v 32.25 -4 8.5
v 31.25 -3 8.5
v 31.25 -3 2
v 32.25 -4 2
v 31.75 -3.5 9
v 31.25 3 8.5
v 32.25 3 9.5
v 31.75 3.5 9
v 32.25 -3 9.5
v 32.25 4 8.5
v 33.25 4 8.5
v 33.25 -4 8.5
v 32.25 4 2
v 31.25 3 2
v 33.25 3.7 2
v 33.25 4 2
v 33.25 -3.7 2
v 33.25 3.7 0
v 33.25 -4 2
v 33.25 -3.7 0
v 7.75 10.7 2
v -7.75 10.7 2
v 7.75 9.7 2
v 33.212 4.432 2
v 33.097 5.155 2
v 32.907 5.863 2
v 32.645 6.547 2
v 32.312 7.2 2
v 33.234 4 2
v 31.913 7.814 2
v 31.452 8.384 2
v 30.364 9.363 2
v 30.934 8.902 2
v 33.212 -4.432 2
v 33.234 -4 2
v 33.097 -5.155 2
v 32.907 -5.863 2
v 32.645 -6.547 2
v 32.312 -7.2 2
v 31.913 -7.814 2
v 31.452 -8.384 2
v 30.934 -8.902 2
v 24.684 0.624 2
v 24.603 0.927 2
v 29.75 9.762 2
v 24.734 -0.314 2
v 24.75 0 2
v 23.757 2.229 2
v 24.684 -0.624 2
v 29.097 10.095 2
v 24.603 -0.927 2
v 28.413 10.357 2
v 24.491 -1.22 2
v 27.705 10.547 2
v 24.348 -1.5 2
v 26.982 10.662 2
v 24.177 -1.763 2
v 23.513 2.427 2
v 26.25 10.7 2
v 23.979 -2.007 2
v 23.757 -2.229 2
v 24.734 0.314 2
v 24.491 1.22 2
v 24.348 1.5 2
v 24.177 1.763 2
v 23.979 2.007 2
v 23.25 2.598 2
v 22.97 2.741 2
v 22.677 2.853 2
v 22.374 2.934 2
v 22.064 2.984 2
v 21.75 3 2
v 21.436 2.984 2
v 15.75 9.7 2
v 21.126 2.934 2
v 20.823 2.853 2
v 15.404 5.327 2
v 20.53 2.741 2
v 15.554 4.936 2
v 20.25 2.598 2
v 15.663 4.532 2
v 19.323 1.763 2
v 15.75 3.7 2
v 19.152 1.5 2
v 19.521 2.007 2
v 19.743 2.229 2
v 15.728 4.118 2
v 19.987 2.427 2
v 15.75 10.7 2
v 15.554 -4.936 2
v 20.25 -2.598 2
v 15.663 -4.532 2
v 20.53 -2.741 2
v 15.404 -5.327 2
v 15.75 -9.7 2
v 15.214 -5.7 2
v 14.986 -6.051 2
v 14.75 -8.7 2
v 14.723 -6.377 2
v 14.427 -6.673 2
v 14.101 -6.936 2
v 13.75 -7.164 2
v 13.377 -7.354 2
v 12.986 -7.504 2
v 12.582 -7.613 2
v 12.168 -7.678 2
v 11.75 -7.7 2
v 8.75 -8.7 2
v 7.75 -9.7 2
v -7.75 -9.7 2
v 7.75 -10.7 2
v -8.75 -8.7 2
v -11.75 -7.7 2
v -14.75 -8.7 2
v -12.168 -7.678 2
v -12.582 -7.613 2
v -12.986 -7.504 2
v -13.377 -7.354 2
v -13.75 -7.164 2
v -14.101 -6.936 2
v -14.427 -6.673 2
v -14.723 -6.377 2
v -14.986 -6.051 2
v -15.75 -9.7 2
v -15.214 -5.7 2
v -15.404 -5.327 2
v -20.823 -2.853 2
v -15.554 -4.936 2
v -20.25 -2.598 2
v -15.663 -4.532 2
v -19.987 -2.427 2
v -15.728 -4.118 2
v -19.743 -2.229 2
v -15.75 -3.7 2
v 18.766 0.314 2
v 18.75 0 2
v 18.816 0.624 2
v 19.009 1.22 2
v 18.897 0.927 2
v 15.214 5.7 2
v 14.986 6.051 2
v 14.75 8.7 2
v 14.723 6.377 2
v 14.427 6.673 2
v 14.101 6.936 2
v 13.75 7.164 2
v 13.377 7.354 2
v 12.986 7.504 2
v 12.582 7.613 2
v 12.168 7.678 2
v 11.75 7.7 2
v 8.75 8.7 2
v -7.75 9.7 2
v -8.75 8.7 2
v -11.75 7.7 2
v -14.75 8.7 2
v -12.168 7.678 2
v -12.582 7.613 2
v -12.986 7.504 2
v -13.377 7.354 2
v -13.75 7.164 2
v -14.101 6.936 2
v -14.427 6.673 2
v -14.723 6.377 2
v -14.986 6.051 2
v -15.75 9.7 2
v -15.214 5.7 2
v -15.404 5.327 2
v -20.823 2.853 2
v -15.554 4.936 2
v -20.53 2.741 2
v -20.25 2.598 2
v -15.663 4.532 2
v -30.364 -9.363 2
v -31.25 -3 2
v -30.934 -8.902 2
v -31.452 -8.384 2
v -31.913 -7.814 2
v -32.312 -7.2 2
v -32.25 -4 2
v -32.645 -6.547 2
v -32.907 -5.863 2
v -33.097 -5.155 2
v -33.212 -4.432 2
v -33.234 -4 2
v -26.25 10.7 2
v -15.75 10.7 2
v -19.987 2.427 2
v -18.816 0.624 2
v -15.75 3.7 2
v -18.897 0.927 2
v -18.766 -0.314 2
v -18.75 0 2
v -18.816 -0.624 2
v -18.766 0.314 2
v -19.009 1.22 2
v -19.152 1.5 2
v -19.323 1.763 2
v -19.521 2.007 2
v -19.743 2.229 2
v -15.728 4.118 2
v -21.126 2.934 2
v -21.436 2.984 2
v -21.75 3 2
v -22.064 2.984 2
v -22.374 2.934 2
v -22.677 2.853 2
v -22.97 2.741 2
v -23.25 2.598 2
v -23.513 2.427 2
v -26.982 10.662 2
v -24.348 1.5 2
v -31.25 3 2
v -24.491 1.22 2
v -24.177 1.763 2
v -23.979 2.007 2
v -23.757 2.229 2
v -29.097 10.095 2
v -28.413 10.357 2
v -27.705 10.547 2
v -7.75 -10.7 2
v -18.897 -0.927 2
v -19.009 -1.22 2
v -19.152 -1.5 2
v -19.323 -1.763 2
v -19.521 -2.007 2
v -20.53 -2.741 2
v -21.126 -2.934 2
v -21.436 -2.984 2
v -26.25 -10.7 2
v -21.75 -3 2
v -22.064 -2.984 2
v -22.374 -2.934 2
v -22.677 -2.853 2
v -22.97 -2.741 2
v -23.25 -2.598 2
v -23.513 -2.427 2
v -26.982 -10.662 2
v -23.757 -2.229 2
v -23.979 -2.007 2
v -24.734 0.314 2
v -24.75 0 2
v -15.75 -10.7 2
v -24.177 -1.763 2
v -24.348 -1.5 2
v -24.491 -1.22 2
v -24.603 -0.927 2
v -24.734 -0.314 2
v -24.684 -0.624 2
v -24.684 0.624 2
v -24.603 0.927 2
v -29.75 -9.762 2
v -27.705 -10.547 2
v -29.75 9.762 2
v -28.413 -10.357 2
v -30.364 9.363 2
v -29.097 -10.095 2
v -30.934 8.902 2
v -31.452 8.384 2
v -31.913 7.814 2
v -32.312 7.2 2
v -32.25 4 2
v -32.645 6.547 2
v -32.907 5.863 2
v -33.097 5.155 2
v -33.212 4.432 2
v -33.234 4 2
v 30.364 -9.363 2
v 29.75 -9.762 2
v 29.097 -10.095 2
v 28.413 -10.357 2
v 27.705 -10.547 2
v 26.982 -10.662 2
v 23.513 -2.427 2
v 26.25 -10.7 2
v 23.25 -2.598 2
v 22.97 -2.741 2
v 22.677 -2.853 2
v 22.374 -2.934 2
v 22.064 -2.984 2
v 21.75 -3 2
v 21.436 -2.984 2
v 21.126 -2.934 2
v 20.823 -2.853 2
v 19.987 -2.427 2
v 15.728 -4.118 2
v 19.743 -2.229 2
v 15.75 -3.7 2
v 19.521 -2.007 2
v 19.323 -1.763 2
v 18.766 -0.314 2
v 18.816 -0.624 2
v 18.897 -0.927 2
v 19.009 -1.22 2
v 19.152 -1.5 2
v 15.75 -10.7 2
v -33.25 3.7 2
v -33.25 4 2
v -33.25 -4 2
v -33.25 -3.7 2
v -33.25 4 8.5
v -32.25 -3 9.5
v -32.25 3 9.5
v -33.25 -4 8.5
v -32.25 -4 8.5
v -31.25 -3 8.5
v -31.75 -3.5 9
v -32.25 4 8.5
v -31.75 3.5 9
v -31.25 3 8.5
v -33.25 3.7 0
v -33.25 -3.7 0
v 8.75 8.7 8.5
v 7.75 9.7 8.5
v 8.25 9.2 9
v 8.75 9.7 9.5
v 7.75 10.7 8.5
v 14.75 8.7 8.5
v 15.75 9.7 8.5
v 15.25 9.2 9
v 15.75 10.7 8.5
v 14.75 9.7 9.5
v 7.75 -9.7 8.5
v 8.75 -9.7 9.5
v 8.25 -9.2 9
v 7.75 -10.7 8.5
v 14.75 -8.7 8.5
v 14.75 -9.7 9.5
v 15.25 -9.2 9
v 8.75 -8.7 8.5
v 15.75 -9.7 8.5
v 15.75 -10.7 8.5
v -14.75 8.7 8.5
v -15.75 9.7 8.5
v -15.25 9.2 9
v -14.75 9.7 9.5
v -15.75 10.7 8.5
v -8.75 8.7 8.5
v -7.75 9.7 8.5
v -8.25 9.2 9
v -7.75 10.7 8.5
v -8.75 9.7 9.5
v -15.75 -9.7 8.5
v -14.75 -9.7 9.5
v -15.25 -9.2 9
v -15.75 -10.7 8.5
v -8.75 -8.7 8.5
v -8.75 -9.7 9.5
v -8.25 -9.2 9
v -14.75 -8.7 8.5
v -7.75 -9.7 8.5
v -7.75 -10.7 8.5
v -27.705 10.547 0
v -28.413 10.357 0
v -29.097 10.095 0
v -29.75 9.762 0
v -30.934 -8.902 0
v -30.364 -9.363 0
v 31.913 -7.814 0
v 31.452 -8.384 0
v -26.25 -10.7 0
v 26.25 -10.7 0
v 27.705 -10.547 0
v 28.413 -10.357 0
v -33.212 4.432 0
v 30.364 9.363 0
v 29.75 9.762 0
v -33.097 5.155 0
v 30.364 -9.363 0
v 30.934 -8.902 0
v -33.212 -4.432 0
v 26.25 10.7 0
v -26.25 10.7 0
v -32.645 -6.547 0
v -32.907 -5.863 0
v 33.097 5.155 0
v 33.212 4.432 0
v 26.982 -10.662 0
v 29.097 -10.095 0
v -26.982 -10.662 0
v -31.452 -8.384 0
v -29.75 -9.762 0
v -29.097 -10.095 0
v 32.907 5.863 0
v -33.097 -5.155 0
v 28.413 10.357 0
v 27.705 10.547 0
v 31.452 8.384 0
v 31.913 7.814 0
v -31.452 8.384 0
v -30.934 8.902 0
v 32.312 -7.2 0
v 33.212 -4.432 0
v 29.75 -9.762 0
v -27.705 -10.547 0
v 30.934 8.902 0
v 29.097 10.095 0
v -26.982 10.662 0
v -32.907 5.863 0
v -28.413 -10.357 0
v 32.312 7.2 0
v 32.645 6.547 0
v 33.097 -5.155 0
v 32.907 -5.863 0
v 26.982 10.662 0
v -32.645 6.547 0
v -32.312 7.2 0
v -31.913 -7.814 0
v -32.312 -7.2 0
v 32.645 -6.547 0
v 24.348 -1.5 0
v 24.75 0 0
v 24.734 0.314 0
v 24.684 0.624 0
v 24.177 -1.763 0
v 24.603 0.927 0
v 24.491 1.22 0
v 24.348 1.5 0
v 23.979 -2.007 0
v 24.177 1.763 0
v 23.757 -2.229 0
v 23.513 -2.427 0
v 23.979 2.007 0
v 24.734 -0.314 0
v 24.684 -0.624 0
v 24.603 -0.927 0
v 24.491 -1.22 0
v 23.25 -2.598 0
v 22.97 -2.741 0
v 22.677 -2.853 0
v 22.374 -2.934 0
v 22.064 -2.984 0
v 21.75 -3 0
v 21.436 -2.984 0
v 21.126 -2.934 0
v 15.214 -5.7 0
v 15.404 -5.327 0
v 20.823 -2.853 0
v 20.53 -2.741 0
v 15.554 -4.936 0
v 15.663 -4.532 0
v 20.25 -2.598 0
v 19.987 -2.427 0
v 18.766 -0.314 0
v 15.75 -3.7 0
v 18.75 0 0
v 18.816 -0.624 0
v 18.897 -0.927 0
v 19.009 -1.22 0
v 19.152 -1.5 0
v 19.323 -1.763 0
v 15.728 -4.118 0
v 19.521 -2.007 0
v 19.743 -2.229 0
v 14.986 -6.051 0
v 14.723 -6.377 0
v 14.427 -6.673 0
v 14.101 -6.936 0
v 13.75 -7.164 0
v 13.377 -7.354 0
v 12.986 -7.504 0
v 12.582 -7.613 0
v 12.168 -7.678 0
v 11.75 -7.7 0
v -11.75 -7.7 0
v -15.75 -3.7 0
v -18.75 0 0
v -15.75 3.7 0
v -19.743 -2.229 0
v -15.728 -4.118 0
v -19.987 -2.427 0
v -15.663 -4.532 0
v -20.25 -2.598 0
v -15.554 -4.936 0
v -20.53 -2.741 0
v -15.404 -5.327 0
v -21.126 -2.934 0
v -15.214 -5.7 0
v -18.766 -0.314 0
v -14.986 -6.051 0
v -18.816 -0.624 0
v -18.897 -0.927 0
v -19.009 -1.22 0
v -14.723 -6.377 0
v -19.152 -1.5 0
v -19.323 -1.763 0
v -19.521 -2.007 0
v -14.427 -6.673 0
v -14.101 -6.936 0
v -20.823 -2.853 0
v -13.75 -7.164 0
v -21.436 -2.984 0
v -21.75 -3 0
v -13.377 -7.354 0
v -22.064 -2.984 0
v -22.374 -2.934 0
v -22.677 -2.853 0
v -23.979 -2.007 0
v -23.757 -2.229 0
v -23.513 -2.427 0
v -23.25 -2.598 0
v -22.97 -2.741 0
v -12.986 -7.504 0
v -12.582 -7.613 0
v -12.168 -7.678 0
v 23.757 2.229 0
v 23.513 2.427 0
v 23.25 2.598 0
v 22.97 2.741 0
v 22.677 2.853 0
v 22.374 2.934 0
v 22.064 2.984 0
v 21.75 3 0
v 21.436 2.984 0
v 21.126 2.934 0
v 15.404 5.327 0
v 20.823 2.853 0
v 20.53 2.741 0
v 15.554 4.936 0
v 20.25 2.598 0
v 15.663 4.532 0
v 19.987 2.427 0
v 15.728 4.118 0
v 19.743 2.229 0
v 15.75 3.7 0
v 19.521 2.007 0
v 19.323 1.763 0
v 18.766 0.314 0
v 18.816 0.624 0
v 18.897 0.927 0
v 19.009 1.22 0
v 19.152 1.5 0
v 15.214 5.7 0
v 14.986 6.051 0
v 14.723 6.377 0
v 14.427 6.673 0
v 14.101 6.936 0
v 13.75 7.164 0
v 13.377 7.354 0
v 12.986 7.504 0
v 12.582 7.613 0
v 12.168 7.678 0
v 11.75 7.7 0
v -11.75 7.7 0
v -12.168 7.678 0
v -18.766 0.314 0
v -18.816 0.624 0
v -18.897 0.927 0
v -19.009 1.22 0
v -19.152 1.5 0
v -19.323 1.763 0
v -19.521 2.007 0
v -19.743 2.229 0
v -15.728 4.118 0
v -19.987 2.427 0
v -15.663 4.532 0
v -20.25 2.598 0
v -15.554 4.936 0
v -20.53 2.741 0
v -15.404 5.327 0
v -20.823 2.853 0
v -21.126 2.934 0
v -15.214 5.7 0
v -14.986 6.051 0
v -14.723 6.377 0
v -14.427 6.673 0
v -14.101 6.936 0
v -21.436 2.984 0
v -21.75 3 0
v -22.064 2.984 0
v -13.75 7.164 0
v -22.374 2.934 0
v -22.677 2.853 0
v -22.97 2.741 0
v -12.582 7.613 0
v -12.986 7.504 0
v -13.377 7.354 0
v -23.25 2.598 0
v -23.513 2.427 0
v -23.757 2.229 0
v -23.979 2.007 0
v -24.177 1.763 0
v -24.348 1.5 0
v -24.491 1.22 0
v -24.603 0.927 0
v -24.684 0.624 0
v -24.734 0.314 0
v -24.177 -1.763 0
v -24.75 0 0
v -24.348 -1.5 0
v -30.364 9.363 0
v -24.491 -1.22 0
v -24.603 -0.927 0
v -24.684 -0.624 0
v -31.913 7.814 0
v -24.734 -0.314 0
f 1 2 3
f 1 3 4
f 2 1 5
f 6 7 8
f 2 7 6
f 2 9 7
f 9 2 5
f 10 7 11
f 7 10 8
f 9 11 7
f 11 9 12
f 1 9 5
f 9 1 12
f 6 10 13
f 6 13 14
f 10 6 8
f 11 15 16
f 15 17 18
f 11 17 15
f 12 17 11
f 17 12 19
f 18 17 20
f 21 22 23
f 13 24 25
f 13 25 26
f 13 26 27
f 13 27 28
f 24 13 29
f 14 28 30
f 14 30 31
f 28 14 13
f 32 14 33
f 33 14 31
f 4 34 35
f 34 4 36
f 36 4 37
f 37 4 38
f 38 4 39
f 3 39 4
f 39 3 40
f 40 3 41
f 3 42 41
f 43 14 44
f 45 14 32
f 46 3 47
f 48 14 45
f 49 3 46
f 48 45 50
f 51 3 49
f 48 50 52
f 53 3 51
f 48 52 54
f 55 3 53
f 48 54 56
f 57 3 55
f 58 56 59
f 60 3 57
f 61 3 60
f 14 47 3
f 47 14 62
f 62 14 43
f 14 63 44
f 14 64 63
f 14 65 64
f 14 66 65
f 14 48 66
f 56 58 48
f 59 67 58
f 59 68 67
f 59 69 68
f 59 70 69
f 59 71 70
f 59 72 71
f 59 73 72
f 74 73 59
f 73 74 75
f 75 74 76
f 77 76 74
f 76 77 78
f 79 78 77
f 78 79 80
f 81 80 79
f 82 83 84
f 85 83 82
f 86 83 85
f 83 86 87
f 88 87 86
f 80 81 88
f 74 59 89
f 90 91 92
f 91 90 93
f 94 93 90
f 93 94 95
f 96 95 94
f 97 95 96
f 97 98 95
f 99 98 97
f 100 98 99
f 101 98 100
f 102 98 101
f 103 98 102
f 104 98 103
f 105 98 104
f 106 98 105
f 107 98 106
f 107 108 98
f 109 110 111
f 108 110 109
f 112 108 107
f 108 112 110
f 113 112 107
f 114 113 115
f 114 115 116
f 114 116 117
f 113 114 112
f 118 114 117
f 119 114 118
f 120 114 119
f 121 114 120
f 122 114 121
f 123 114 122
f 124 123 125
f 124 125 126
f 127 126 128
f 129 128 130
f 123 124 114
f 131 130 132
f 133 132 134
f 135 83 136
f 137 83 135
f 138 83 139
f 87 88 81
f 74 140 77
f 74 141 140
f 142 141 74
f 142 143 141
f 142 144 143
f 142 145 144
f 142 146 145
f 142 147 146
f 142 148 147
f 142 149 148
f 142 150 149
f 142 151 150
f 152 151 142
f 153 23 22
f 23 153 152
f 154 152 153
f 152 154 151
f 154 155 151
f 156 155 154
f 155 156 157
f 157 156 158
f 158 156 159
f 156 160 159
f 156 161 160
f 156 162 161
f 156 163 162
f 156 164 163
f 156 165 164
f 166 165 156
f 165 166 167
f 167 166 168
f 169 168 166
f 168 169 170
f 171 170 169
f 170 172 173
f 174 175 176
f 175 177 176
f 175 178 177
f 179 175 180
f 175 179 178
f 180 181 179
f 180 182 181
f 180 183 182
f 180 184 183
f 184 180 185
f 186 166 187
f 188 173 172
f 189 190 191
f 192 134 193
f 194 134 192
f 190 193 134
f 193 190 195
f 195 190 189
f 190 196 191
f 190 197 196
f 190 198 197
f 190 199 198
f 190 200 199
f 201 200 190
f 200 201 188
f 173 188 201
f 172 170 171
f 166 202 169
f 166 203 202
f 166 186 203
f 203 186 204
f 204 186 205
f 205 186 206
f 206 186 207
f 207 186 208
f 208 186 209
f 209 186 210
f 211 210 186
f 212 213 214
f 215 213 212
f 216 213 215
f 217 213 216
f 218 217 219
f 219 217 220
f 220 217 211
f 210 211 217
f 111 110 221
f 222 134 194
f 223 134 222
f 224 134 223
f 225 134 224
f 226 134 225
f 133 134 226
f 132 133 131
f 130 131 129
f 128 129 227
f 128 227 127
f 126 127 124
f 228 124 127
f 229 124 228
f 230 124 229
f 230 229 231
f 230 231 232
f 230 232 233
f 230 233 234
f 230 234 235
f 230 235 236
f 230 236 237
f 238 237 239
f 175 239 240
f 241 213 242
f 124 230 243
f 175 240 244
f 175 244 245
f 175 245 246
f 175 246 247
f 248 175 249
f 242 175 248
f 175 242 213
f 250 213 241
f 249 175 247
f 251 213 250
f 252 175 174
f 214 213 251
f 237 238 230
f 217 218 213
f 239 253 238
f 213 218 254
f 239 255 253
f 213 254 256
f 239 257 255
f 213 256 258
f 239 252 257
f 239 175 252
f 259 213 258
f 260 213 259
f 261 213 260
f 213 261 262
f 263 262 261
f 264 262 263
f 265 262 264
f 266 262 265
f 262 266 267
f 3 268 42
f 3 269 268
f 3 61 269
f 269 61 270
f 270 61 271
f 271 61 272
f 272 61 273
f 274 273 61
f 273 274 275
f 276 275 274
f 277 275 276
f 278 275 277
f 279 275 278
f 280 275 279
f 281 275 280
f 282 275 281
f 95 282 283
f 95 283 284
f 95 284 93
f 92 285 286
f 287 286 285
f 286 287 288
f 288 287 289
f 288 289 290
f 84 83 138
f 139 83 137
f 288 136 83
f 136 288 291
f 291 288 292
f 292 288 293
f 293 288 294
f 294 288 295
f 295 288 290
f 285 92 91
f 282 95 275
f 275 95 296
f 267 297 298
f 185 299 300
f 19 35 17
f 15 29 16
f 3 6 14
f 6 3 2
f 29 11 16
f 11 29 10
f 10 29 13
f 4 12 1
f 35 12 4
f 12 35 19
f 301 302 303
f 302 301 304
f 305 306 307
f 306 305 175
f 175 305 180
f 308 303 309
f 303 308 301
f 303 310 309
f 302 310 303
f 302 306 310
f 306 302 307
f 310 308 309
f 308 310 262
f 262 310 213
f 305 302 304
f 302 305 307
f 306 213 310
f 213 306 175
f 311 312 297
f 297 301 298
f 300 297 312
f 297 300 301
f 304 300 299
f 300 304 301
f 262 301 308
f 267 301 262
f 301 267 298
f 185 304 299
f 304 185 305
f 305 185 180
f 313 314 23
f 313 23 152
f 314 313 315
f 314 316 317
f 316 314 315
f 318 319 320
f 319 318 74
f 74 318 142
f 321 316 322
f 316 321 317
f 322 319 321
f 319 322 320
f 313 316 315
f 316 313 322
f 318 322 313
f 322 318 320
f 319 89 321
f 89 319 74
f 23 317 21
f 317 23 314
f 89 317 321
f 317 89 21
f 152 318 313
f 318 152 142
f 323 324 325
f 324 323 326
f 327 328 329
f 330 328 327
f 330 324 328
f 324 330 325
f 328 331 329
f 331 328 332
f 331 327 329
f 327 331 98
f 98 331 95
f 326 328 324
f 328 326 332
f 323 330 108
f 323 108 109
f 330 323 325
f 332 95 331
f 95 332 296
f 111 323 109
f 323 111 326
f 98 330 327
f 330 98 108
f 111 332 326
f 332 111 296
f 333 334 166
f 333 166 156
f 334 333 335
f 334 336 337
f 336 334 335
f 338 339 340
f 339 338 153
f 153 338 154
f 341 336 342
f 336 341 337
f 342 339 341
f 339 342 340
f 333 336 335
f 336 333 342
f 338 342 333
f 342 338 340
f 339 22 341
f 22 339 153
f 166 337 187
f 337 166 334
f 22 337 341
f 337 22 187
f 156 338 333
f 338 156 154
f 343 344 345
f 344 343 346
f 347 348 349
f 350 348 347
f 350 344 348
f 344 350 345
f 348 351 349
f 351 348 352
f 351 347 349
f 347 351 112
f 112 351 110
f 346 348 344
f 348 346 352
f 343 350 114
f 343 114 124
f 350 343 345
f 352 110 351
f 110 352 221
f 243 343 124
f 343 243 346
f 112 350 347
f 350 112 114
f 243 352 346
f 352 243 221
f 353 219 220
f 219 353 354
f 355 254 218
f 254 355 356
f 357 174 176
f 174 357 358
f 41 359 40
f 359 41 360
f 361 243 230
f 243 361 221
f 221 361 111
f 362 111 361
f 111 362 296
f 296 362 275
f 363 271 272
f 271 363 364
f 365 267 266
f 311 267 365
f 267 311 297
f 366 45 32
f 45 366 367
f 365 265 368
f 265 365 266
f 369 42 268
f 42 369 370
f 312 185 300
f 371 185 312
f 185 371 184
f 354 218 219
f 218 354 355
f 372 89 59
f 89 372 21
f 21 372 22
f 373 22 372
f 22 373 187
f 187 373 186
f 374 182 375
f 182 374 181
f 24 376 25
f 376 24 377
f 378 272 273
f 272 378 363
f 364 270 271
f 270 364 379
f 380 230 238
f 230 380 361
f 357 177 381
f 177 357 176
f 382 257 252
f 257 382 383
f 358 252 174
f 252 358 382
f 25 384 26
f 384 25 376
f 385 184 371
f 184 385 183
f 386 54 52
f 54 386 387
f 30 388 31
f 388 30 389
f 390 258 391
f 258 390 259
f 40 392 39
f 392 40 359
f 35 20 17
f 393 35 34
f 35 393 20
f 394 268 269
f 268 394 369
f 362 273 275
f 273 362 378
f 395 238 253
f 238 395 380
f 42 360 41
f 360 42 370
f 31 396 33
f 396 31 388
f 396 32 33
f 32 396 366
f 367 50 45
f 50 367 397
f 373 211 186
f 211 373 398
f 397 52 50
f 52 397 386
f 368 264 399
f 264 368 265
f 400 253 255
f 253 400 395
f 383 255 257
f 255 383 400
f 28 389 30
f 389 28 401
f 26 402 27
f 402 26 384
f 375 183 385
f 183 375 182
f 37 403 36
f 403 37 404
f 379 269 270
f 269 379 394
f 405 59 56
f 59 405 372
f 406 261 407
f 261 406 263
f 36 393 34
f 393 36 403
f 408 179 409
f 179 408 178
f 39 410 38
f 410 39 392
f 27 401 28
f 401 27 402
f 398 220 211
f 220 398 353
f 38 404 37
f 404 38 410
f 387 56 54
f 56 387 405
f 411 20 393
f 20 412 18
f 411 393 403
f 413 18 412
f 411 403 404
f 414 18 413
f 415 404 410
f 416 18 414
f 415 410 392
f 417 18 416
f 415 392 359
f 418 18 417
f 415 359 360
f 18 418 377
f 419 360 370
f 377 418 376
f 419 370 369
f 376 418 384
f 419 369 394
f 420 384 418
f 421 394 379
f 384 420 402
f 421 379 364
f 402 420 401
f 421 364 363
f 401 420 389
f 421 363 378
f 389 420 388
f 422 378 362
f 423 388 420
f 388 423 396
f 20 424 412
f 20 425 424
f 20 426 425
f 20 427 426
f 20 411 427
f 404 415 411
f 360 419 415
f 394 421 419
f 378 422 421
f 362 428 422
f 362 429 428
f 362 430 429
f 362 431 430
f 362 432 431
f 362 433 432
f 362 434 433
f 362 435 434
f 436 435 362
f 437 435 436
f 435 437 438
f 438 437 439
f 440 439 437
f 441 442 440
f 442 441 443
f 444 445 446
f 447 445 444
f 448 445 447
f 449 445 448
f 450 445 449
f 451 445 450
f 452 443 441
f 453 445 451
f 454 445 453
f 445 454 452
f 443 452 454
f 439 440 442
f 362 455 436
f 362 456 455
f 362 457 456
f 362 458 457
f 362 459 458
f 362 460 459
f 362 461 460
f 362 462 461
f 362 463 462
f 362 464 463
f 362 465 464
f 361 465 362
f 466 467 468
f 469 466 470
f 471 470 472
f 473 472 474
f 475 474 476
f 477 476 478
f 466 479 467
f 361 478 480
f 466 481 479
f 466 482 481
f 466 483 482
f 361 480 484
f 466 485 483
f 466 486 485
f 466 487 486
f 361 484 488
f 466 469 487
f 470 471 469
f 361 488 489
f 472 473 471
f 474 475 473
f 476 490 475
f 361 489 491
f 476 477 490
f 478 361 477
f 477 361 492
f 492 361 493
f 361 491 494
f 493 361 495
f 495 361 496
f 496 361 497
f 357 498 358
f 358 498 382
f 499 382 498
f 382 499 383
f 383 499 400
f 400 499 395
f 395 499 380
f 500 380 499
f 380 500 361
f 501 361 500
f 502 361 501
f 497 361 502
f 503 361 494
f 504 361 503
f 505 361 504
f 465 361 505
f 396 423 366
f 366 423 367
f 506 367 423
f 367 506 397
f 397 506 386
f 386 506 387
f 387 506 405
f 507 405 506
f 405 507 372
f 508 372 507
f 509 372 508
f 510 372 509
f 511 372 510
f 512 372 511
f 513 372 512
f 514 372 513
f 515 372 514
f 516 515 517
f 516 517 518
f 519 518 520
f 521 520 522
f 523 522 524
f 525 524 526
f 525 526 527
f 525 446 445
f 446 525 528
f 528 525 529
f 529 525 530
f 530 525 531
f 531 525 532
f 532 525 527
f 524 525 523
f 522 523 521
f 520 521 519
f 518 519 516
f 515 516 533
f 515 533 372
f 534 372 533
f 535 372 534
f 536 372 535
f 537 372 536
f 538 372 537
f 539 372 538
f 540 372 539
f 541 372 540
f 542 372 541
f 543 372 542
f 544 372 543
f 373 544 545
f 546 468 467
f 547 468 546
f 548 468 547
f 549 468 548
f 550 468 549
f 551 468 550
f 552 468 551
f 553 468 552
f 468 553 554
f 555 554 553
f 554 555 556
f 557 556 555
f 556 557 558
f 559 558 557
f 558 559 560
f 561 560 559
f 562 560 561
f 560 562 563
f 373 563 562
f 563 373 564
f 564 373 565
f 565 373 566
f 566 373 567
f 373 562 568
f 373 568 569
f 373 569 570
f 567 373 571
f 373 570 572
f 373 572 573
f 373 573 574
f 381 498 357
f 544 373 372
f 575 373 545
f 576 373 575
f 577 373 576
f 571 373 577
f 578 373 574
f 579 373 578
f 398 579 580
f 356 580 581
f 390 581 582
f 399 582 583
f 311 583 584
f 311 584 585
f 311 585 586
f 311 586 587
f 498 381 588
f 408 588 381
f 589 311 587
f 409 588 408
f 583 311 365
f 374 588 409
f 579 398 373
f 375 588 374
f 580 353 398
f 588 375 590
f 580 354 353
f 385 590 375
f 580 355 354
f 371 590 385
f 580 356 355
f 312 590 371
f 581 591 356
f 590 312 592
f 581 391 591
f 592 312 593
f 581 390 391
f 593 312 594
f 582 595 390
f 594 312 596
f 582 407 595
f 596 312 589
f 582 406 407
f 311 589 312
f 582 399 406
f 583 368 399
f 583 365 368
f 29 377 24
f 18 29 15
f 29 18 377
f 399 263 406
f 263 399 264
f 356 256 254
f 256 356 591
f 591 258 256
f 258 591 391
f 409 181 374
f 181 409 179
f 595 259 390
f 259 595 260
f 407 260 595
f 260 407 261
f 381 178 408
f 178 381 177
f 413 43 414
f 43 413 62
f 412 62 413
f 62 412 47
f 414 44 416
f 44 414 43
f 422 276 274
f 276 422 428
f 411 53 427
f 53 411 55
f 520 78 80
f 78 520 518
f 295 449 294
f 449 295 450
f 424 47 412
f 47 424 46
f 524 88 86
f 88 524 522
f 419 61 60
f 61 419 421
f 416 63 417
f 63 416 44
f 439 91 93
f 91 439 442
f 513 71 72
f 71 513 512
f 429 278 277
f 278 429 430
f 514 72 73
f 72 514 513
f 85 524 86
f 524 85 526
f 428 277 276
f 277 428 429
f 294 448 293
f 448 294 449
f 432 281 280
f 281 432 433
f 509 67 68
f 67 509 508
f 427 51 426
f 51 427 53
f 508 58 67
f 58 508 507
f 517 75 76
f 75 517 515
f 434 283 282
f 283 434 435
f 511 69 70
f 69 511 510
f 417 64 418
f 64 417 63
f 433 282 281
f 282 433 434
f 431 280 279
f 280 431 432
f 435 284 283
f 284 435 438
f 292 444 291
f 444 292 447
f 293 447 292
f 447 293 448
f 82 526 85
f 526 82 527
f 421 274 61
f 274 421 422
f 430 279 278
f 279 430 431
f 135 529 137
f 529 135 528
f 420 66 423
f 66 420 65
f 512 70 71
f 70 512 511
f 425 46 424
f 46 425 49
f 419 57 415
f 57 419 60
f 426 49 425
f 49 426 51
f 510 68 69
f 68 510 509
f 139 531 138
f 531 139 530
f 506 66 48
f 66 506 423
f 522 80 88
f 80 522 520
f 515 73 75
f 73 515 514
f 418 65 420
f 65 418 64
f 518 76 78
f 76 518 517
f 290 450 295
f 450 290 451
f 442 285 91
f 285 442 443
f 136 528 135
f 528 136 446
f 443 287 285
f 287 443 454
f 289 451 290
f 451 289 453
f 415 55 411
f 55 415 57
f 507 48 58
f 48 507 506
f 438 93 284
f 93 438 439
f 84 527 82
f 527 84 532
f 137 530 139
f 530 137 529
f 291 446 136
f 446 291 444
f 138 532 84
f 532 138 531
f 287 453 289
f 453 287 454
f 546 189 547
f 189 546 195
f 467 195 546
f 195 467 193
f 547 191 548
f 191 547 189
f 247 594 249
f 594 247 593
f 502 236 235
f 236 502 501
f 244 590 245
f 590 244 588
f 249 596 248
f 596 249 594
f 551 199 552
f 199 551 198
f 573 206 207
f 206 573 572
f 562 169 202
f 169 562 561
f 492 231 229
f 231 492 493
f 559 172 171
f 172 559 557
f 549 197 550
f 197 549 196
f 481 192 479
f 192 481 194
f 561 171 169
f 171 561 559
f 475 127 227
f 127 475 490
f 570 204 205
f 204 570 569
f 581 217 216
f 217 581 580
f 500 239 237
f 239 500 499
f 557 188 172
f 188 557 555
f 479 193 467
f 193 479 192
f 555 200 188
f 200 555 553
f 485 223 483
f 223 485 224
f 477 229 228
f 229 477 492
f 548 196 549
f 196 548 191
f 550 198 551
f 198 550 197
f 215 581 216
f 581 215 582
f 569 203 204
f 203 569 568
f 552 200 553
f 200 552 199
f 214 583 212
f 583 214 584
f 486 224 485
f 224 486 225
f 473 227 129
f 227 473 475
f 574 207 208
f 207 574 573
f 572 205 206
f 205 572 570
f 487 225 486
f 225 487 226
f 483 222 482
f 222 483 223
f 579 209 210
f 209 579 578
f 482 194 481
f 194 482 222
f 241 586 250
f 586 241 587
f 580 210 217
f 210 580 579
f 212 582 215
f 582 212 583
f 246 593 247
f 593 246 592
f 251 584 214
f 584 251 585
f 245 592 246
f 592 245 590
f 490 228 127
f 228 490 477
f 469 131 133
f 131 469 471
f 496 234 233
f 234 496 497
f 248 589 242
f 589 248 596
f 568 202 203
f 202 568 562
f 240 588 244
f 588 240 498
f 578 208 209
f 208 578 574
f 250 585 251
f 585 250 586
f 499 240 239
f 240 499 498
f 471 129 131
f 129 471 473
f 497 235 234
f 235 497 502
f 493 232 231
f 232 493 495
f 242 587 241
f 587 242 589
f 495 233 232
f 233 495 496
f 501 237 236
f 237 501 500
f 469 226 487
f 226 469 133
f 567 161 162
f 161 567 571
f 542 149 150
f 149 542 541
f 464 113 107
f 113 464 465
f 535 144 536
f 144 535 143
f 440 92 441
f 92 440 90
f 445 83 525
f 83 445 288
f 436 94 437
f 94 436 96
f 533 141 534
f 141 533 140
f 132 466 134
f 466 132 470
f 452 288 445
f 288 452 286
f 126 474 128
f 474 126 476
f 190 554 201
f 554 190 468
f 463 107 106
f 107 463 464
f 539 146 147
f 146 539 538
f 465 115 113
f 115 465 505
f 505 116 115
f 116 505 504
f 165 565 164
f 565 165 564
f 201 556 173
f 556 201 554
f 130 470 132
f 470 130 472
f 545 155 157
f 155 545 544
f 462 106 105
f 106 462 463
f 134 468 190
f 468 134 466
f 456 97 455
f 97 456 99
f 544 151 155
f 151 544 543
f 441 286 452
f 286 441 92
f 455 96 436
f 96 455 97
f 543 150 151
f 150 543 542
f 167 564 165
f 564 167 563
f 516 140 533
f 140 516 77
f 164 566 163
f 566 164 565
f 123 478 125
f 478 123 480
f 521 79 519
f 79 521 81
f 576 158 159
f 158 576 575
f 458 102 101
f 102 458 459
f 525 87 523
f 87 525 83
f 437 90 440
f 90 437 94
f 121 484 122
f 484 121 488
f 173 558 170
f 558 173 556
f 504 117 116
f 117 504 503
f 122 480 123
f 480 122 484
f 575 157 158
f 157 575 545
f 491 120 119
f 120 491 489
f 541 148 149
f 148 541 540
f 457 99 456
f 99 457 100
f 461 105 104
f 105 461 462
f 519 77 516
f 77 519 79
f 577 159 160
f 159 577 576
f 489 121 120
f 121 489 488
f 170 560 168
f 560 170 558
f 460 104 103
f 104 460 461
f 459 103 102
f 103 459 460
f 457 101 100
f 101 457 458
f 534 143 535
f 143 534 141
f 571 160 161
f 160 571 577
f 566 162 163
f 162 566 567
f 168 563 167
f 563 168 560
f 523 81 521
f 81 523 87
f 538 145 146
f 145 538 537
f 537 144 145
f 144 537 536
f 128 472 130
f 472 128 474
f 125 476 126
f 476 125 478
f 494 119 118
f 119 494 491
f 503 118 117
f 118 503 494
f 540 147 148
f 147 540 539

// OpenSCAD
//This code uses the 'Chamfered primitives for OpenSCAD library, by SebiTimeWaster - https://github.com/SebiTimeWaster/Chamfers-for-OpenSCAD
//For the convenience of users, that code is included in this file, as noted in the lower part of this file
//For users wishing to link in the latest Chamfers-for-OpenSCAD code, the following line can be uncommented, and the included code at the bottom of this page can be commented out or removed.
//use <Chamfers-for-OpenSCAD/Chamfer.scad>;
    
$fn=60;

bolt_c_c = 43.5;        //center-to-center distance between bolts
bolt_shank_dia = 6;     //shank diameter of bolt (where bolting battery tray to quad frame) - make same diameter as bolt head for tray that will simply sit over bolt heads
bolt_head_dia = 6;      //bolt head diameter of bolt (where countersinking bolt, or making tray to sit over bolt head)
bolt_head_inset = 1;    //depth to countersink bolt head to (applicable if bolt shank and head settings are different diameters)
batt_len = 62.5;        //length of the battery, plus a mm or so of wiggle room
batt_w = 17.4;          //width of the battery, plus a mm or so of wiggle room
base_t = 2;             //thickness of the base plate
base_corner_r = 7;      //corner radius of plate external corners - must be a sensible value that works with plate width - some experimentation may be needed
finger_t = 2;           //thickness of battery holding fingers
finger_w = 8;           //width of battery holding fingers
finger_h = 7.5;         //height of battery holding fingers
hole_web_t = 3;         //width of side walls - should be at least as bit as finger_t parameter
center_hole_r = 4;      //inside corner radious of plate internal corners - must be a sensible value that works with plate width - some experimentation may be needed

difference() {
    union() {
        batt_base();
        batt_fingers();
    }
    
    bolt_holes();
    center_hole();
}



module batt_base() {
    hull() {
        translate([batt_len/2 - base_corner_r + finger_t, batt_w/2 - base_corner_r + finger_t, 0]) {
            cylinder(r=base_corner_r, h=base_t);
        }
        translate([batt_len/2 - base_corner_r + finger_t, -batt_w/2 + base_corner_r - finger_t, 0]) {
            cylinder(r=base_corner_r, h=base_t);
        }
        translate([-batt_len/2 + base_corner_r - finger_t, batt_w/2 - base_corner_r + finger_t, 0]) {
            cylinder(r=base_corner_r, h=base_t);
        }
        translate([-batt_len/2 + base_corner_r - finger_t, -batt_w/2 + base_corner_r - finger_t, 0]) {
            cylinder(r=base_corner_r, h=base_t);
        }
       }
}

module batt_fingers() {
    //end fingers
    translate([batt_len/2, -finger_w/2, base_t]) {
         chamferCube(finger_t, finger_w, finger_h, chamferHeight=1, chamferX = [0,0,1,1], chamferY = [0,1,1,0], chamferZ = [1,0,0,1]); 
    }
    translate([-batt_len/2 - finger_t, -finger_w/2, base_t]) {
        chamferCube(finger_t, finger_w, finger_h, chamferHeight=1, chamferX = [0,0,1,1], chamferY = [0,1,1,0], chamferZ = [0,1,1,0]); 
    }
    
    //side fingers
    translate([bolt_c_c/2 - bolt_shank_dia/2 - hole_web_t - finger_w, batt_w/2, base_t]) {
        chamferCube(finger_w, finger_t, finger_h, chamferHeight=1, chamferX = [0,0,1,1], chamferY = [0,1,1,0], chamferZ = [1,1,0,0]);
    }
    
    translate([bolt_c_c/2 - bolt_shank_dia/2 - hole_web_t - finger_w, -batt_w/2 - finger_t, base_t]) {
        chamferCube(finger_w, finger_t, finger_h, chamferHeight=1, chamferX = [0,0,1,1], chamferY = [0,1,1,0], chamferZ = [0,0,1,1]);
    }

    translate([-bolt_c_c/2 + bolt_shank_dia/2 + hole_web_t, batt_w/2, base_t]) {
        chamferCube(finger_w, finger_t, finger_h, chamferHeight=1, chamferX = [0,0,1,1], chamferY = [0,1,1,0], chamferZ = [1,1,0,0]);
    }
    
    translate([-bolt_c_c/2 + bolt_shank_dia/2 + hole_web_t, -batt_w/2 - finger_t, base_t]) {
        chamferCube(finger_w, finger_t, finger_h, chamferHeight=1, chamferX = [0,0,1,1], chamferY = [0,1,1,0], chamferZ = [0,0,1,1]);
    }
}

module center_hole() {
    hull() {
        translate([bolt_c_c/2 - bolt_shank_dia/2 - hole_web_t - center_hole_r, batt_w/2 - center_hole_r + finger_t - hole_web_t]) {
            cylinder(r=center_hole_r, h=base_t);
        }
        translate([bolt_c_c/2 - bolt_shank_dia/2 - hole_web_t - center_hole_r, -(batt_w/2 - center_hole_r + finger_t - hole_web_t), 0]) {
            cylinder(r=center_hole_r, h=base_t);
        }
        translate([-(bolt_c_c/2 - bolt_shank_dia/2 - hole_web_t - center_hole_r), batt_w/2 - center_hole_r + finger_t - hole_web_t, 0]) {
            cylinder(r=center_hole_r, h=base_t);
        }
        translate([-(bolt_c_c/2 - bolt_shank_dia/2 - hole_web_t - center_hole_r), -(batt_w/2 - center_hole_r + finger_t - hole_web_t), 0]) {
            cylinder(r=center_hole_r, h=base_t);
        }
    }
}

module bolt_holes() {
    translate([bolt_c_c/2, 0, 0]) {
        cylinder(d=bolt_shank_dia, h=base_t);
    }

    translate([-bolt_c_c/2, 0, 0]) {
        cylinder(d=bolt_shank_dia, h=base_t);
    }
    //bolt head holes
    translate([bolt_c_c/2, 0, base_t - bolt_head_inset]) {
        cylinder(d=bolt_head_dia, h=base_t);
    }

    translate([-bolt_c_c/2, 0,  base_t - bolt_head_inset]) {
        cylinder(d=bolt_head_dia, h=base_t);
    }
}

//vvvvvv SebiTimeWaster Chamfers-for-OpenSCAD code is included below, for end user convenience.
//       If desired, the following code can be commented out or removed, and the latest Chamfers-for-OpenSCAD code
//       can be linked in, via the 'use <Chamfers-for-OpenSCAD/Chamfer.scad>;' line near the top of this file
/**
  *  The MIT License (MIT)
  *
  *  "Chamfers for OpenSCAD" v0.31 Copyright (c) 2016 SebiTimeWaster
  *
  *  Permission is hereby granted, free of charge, to any person obtaining a copy
  *  of this software and associated documentation files (the "Software"), to deal
  *  in the Software without restriction, including without limitation the rights
  *  to use, copy, modify, merge, publish, distribute, sublicense, and/or sell
  *  copies of the Software, and to permit persons to whom the Software is
  *  furnished to do so, subject to the following conditions:
  *
  *  The above copyright notice and this permission notice shall be included in all
  *  copies or substantial portions of the Software.
  *
  *  THE SOFTWARE IS PROVIDED "AS IS", WITHOUT WARRANTY OF ANY KIND, EXPRESS OR
  *  IMPLIED, INCLUDING BUT NOT LIMITED TO THE WARRANTIES OF MERCHANTABILITY,
  *  FITNESS FOR A PARTICULAR PURPOSE AND NONINFRINGEMENT. IN NO EVENT SHALL THE
  *  AUTHORS OR COPYRIGHT HOLDERS BE LIABLE FOR ANY CLAIM, DAMAGES OR OTHER
  *  LIABILITY, WHETHER IN AN ACTION OF CONTRACT, TORT OR OTHERWISE, ARISING FROM,
  *  OUT OF OR IN CONNECTION WITH THE SOFTWARE OR THE USE OR OTHER DEALINGS IN THE
  *  SOFTWARE.
  */

/**
  * chamferCube returns an cube with 45° chamfers on the edges of the
  * cube. The chamfers are diectly printable on Fused deposition
  * modelling (FDM) printers without support structures.
  *
  * @param  sizeX          The size of the cube along the x axis
  * @param  sizeY          The size of the cube along the y axis
  * @param  sizeZ          The size of the cube along the z axis
  * @param  chamferHeight  The "height" of the chamfers as seen from
  *                        one of the dimensional planes (The real
  *                        width is side c in a right angled triangle)
  * @param  chamferX       Which chamfers to render along the x axis
  *                        in clockwise order starting from the zero
  *                        point, as seen from "Left view" (Ctrl + 6)
  * @param  chamferY       Which chamfers to render along the y axis
  *                        in clockwise order starting from the zero
  *                        point, as seen from "Front view" (Ctrl + 8)
  * @param  chamferZ       Which chamfers to render along the z axis
  *                        in clockwise order starting from the zero
  *                        point, as seen from "Bottom view" (Ctrl + 5)
  */
module chamferCube(sizeX, sizeY, sizeZ, chamferHeight = 1, chamferX = [1, 1, 1, 1], chamferY = [1, 1, 1, 1], chamferZ = [1, 1, 1, 1]) {
    chamferCLength = sqrt(chamferHeight * chamferHeight * 2);
    difference() {
        cube([sizeX, sizeY, sizeZ]);
        for(x = [0 : 3]) {
            chamferSide1 = min(x, 1) - floor(x / 3); // 0 1 1 0
            chamferSide2 = floor(x / 2); // 0 0 1 1
            if(chamferX[x]) {
                translate([-0.1, chamferSide1 * sizeY, -chamferHeight + chamferSide2 * sizeZ])
                rotate([45, 0, 0])
                cube([sizeX + 0.2, chamferCLength, chamferCLength]);
            }
            if(chamferY[x]) {
                translate([-chamferHeight + chamferSide2 * sizeX, -0.1, chamferSide1 * sizeZ])
                rotate([0, 45, 0])
                cube([chamferCLength, sizeY + 0.2, chamferCLength]);
            }
            if(chamferZ[x]) {
                translate([chamferSide1 * sizeX, -chamferHeight + chamferSide2 * sizeY, -0.1])
                rotate([0, 0, 45])
                cube([chamferCLength, chamferCLength, sizeZ + 0.2]);
            }
        }
    }
}

/**
  * chamferCylinder returns an cylinder or cone with 45° chamfers on
  * the edges of the cylinder. The chamfers are diectly printable on
  * Fused deposition modelling (FDM) printers without support structures.
  *
  * @param  height         Height of the cylinder
  * @param  radius         Radius of the cylinder (At the bottom)
  * @param  radius2        Radius of the cylinder (At the top)
  * @param  chamferHeight  The "height" of the chamfers as seen from
  *                        one of the dimensional planes (The real
  *                        width is side c in a right angled triangle)
  * @param  angle          The radius of the visible part of a wedge
  *                        starting from the x axis counter-clockwise
  * @param  quality        A circle quality factor where 1.0 is a fairly
  *                        good quality, range from 0.0 to 2.0
  */
module chamferCylinder(height, radius, radius2=undef, chamferHeight = 1, angle = 0, quality = -1.0) {
    radius2 = (radius2 == undef) ? radius : radius2;
    module cc() {
        if(chamferHeight != 0) {
            translate([0, 0, height - abs(chamferHeight)]) cylinder(abs(chamferHeight), r1 = radius2, r2 = radius2 - chamferHeight, $fn = circleSegments(radius2, quality));
        }
        translate([0, 0, abs(chamferHeight)]) cylinder(height - abs(chamferHeight) * 2, r1 = radius, r2 = radius2, $fn = circleSegments(max(radius, radius2), quality));
        if(chamferHeight != 0) {
            cylinder(abs(chamferHeight), r1 = radius - chamferHeight, r2 = radius, $fn = circleSegments(radius, quality));
        }
    }
    module box(brim = abs(min(chamferHeight, 0)) + 1) {
        translate([-radius - brim, 0, -brim]) cube([radius * 2 + brim * 2, radius + brim, height + brim * 2]);
    }
    module hcc() {
        intersection() {
            cc();
            box();
        }
    }
    if(angle <= 0 || angle >= 360) cc();
    else {
        if(angle > 180) hcc();
        difference() {
            if(angle <= 180) hcc();
            else rotate([0, 0, 180]) hcc();
            rotate([0, 0, angle]) box(abs(min(chamferHeight, 0)) + radius);
        }
    }
}

/**
  * circleSegments calculates the number of segments needed to maintain
  * a constant circle quality.
  * If a globalSegementsQuality variable exist it will overwrite the
  * standard quality setting (1.0). Order of usage is:
  * Standard (1.0) <- globalCircleQuality <- Quality parameter
  *
  * @param  r        Radius of the circle
  * @param  quality  A quality factor, where 1.0 is a fairly good
  *                  quality, range from 0.0 to 2.0
  *
  * @return  The number of segments for the circle
  */
function circleSegments(r, quality = -1.0) = (r * PI * 4 + 40) * ((quality >= 0.0) ? quality : globalCircleQuality);

// set global quality to 1.0, can be overridden by user
globalCircleQuality = 1.0;
//^^^^^ end of SebiTimeWaster's Chamfers-for-OpenSCAD code
